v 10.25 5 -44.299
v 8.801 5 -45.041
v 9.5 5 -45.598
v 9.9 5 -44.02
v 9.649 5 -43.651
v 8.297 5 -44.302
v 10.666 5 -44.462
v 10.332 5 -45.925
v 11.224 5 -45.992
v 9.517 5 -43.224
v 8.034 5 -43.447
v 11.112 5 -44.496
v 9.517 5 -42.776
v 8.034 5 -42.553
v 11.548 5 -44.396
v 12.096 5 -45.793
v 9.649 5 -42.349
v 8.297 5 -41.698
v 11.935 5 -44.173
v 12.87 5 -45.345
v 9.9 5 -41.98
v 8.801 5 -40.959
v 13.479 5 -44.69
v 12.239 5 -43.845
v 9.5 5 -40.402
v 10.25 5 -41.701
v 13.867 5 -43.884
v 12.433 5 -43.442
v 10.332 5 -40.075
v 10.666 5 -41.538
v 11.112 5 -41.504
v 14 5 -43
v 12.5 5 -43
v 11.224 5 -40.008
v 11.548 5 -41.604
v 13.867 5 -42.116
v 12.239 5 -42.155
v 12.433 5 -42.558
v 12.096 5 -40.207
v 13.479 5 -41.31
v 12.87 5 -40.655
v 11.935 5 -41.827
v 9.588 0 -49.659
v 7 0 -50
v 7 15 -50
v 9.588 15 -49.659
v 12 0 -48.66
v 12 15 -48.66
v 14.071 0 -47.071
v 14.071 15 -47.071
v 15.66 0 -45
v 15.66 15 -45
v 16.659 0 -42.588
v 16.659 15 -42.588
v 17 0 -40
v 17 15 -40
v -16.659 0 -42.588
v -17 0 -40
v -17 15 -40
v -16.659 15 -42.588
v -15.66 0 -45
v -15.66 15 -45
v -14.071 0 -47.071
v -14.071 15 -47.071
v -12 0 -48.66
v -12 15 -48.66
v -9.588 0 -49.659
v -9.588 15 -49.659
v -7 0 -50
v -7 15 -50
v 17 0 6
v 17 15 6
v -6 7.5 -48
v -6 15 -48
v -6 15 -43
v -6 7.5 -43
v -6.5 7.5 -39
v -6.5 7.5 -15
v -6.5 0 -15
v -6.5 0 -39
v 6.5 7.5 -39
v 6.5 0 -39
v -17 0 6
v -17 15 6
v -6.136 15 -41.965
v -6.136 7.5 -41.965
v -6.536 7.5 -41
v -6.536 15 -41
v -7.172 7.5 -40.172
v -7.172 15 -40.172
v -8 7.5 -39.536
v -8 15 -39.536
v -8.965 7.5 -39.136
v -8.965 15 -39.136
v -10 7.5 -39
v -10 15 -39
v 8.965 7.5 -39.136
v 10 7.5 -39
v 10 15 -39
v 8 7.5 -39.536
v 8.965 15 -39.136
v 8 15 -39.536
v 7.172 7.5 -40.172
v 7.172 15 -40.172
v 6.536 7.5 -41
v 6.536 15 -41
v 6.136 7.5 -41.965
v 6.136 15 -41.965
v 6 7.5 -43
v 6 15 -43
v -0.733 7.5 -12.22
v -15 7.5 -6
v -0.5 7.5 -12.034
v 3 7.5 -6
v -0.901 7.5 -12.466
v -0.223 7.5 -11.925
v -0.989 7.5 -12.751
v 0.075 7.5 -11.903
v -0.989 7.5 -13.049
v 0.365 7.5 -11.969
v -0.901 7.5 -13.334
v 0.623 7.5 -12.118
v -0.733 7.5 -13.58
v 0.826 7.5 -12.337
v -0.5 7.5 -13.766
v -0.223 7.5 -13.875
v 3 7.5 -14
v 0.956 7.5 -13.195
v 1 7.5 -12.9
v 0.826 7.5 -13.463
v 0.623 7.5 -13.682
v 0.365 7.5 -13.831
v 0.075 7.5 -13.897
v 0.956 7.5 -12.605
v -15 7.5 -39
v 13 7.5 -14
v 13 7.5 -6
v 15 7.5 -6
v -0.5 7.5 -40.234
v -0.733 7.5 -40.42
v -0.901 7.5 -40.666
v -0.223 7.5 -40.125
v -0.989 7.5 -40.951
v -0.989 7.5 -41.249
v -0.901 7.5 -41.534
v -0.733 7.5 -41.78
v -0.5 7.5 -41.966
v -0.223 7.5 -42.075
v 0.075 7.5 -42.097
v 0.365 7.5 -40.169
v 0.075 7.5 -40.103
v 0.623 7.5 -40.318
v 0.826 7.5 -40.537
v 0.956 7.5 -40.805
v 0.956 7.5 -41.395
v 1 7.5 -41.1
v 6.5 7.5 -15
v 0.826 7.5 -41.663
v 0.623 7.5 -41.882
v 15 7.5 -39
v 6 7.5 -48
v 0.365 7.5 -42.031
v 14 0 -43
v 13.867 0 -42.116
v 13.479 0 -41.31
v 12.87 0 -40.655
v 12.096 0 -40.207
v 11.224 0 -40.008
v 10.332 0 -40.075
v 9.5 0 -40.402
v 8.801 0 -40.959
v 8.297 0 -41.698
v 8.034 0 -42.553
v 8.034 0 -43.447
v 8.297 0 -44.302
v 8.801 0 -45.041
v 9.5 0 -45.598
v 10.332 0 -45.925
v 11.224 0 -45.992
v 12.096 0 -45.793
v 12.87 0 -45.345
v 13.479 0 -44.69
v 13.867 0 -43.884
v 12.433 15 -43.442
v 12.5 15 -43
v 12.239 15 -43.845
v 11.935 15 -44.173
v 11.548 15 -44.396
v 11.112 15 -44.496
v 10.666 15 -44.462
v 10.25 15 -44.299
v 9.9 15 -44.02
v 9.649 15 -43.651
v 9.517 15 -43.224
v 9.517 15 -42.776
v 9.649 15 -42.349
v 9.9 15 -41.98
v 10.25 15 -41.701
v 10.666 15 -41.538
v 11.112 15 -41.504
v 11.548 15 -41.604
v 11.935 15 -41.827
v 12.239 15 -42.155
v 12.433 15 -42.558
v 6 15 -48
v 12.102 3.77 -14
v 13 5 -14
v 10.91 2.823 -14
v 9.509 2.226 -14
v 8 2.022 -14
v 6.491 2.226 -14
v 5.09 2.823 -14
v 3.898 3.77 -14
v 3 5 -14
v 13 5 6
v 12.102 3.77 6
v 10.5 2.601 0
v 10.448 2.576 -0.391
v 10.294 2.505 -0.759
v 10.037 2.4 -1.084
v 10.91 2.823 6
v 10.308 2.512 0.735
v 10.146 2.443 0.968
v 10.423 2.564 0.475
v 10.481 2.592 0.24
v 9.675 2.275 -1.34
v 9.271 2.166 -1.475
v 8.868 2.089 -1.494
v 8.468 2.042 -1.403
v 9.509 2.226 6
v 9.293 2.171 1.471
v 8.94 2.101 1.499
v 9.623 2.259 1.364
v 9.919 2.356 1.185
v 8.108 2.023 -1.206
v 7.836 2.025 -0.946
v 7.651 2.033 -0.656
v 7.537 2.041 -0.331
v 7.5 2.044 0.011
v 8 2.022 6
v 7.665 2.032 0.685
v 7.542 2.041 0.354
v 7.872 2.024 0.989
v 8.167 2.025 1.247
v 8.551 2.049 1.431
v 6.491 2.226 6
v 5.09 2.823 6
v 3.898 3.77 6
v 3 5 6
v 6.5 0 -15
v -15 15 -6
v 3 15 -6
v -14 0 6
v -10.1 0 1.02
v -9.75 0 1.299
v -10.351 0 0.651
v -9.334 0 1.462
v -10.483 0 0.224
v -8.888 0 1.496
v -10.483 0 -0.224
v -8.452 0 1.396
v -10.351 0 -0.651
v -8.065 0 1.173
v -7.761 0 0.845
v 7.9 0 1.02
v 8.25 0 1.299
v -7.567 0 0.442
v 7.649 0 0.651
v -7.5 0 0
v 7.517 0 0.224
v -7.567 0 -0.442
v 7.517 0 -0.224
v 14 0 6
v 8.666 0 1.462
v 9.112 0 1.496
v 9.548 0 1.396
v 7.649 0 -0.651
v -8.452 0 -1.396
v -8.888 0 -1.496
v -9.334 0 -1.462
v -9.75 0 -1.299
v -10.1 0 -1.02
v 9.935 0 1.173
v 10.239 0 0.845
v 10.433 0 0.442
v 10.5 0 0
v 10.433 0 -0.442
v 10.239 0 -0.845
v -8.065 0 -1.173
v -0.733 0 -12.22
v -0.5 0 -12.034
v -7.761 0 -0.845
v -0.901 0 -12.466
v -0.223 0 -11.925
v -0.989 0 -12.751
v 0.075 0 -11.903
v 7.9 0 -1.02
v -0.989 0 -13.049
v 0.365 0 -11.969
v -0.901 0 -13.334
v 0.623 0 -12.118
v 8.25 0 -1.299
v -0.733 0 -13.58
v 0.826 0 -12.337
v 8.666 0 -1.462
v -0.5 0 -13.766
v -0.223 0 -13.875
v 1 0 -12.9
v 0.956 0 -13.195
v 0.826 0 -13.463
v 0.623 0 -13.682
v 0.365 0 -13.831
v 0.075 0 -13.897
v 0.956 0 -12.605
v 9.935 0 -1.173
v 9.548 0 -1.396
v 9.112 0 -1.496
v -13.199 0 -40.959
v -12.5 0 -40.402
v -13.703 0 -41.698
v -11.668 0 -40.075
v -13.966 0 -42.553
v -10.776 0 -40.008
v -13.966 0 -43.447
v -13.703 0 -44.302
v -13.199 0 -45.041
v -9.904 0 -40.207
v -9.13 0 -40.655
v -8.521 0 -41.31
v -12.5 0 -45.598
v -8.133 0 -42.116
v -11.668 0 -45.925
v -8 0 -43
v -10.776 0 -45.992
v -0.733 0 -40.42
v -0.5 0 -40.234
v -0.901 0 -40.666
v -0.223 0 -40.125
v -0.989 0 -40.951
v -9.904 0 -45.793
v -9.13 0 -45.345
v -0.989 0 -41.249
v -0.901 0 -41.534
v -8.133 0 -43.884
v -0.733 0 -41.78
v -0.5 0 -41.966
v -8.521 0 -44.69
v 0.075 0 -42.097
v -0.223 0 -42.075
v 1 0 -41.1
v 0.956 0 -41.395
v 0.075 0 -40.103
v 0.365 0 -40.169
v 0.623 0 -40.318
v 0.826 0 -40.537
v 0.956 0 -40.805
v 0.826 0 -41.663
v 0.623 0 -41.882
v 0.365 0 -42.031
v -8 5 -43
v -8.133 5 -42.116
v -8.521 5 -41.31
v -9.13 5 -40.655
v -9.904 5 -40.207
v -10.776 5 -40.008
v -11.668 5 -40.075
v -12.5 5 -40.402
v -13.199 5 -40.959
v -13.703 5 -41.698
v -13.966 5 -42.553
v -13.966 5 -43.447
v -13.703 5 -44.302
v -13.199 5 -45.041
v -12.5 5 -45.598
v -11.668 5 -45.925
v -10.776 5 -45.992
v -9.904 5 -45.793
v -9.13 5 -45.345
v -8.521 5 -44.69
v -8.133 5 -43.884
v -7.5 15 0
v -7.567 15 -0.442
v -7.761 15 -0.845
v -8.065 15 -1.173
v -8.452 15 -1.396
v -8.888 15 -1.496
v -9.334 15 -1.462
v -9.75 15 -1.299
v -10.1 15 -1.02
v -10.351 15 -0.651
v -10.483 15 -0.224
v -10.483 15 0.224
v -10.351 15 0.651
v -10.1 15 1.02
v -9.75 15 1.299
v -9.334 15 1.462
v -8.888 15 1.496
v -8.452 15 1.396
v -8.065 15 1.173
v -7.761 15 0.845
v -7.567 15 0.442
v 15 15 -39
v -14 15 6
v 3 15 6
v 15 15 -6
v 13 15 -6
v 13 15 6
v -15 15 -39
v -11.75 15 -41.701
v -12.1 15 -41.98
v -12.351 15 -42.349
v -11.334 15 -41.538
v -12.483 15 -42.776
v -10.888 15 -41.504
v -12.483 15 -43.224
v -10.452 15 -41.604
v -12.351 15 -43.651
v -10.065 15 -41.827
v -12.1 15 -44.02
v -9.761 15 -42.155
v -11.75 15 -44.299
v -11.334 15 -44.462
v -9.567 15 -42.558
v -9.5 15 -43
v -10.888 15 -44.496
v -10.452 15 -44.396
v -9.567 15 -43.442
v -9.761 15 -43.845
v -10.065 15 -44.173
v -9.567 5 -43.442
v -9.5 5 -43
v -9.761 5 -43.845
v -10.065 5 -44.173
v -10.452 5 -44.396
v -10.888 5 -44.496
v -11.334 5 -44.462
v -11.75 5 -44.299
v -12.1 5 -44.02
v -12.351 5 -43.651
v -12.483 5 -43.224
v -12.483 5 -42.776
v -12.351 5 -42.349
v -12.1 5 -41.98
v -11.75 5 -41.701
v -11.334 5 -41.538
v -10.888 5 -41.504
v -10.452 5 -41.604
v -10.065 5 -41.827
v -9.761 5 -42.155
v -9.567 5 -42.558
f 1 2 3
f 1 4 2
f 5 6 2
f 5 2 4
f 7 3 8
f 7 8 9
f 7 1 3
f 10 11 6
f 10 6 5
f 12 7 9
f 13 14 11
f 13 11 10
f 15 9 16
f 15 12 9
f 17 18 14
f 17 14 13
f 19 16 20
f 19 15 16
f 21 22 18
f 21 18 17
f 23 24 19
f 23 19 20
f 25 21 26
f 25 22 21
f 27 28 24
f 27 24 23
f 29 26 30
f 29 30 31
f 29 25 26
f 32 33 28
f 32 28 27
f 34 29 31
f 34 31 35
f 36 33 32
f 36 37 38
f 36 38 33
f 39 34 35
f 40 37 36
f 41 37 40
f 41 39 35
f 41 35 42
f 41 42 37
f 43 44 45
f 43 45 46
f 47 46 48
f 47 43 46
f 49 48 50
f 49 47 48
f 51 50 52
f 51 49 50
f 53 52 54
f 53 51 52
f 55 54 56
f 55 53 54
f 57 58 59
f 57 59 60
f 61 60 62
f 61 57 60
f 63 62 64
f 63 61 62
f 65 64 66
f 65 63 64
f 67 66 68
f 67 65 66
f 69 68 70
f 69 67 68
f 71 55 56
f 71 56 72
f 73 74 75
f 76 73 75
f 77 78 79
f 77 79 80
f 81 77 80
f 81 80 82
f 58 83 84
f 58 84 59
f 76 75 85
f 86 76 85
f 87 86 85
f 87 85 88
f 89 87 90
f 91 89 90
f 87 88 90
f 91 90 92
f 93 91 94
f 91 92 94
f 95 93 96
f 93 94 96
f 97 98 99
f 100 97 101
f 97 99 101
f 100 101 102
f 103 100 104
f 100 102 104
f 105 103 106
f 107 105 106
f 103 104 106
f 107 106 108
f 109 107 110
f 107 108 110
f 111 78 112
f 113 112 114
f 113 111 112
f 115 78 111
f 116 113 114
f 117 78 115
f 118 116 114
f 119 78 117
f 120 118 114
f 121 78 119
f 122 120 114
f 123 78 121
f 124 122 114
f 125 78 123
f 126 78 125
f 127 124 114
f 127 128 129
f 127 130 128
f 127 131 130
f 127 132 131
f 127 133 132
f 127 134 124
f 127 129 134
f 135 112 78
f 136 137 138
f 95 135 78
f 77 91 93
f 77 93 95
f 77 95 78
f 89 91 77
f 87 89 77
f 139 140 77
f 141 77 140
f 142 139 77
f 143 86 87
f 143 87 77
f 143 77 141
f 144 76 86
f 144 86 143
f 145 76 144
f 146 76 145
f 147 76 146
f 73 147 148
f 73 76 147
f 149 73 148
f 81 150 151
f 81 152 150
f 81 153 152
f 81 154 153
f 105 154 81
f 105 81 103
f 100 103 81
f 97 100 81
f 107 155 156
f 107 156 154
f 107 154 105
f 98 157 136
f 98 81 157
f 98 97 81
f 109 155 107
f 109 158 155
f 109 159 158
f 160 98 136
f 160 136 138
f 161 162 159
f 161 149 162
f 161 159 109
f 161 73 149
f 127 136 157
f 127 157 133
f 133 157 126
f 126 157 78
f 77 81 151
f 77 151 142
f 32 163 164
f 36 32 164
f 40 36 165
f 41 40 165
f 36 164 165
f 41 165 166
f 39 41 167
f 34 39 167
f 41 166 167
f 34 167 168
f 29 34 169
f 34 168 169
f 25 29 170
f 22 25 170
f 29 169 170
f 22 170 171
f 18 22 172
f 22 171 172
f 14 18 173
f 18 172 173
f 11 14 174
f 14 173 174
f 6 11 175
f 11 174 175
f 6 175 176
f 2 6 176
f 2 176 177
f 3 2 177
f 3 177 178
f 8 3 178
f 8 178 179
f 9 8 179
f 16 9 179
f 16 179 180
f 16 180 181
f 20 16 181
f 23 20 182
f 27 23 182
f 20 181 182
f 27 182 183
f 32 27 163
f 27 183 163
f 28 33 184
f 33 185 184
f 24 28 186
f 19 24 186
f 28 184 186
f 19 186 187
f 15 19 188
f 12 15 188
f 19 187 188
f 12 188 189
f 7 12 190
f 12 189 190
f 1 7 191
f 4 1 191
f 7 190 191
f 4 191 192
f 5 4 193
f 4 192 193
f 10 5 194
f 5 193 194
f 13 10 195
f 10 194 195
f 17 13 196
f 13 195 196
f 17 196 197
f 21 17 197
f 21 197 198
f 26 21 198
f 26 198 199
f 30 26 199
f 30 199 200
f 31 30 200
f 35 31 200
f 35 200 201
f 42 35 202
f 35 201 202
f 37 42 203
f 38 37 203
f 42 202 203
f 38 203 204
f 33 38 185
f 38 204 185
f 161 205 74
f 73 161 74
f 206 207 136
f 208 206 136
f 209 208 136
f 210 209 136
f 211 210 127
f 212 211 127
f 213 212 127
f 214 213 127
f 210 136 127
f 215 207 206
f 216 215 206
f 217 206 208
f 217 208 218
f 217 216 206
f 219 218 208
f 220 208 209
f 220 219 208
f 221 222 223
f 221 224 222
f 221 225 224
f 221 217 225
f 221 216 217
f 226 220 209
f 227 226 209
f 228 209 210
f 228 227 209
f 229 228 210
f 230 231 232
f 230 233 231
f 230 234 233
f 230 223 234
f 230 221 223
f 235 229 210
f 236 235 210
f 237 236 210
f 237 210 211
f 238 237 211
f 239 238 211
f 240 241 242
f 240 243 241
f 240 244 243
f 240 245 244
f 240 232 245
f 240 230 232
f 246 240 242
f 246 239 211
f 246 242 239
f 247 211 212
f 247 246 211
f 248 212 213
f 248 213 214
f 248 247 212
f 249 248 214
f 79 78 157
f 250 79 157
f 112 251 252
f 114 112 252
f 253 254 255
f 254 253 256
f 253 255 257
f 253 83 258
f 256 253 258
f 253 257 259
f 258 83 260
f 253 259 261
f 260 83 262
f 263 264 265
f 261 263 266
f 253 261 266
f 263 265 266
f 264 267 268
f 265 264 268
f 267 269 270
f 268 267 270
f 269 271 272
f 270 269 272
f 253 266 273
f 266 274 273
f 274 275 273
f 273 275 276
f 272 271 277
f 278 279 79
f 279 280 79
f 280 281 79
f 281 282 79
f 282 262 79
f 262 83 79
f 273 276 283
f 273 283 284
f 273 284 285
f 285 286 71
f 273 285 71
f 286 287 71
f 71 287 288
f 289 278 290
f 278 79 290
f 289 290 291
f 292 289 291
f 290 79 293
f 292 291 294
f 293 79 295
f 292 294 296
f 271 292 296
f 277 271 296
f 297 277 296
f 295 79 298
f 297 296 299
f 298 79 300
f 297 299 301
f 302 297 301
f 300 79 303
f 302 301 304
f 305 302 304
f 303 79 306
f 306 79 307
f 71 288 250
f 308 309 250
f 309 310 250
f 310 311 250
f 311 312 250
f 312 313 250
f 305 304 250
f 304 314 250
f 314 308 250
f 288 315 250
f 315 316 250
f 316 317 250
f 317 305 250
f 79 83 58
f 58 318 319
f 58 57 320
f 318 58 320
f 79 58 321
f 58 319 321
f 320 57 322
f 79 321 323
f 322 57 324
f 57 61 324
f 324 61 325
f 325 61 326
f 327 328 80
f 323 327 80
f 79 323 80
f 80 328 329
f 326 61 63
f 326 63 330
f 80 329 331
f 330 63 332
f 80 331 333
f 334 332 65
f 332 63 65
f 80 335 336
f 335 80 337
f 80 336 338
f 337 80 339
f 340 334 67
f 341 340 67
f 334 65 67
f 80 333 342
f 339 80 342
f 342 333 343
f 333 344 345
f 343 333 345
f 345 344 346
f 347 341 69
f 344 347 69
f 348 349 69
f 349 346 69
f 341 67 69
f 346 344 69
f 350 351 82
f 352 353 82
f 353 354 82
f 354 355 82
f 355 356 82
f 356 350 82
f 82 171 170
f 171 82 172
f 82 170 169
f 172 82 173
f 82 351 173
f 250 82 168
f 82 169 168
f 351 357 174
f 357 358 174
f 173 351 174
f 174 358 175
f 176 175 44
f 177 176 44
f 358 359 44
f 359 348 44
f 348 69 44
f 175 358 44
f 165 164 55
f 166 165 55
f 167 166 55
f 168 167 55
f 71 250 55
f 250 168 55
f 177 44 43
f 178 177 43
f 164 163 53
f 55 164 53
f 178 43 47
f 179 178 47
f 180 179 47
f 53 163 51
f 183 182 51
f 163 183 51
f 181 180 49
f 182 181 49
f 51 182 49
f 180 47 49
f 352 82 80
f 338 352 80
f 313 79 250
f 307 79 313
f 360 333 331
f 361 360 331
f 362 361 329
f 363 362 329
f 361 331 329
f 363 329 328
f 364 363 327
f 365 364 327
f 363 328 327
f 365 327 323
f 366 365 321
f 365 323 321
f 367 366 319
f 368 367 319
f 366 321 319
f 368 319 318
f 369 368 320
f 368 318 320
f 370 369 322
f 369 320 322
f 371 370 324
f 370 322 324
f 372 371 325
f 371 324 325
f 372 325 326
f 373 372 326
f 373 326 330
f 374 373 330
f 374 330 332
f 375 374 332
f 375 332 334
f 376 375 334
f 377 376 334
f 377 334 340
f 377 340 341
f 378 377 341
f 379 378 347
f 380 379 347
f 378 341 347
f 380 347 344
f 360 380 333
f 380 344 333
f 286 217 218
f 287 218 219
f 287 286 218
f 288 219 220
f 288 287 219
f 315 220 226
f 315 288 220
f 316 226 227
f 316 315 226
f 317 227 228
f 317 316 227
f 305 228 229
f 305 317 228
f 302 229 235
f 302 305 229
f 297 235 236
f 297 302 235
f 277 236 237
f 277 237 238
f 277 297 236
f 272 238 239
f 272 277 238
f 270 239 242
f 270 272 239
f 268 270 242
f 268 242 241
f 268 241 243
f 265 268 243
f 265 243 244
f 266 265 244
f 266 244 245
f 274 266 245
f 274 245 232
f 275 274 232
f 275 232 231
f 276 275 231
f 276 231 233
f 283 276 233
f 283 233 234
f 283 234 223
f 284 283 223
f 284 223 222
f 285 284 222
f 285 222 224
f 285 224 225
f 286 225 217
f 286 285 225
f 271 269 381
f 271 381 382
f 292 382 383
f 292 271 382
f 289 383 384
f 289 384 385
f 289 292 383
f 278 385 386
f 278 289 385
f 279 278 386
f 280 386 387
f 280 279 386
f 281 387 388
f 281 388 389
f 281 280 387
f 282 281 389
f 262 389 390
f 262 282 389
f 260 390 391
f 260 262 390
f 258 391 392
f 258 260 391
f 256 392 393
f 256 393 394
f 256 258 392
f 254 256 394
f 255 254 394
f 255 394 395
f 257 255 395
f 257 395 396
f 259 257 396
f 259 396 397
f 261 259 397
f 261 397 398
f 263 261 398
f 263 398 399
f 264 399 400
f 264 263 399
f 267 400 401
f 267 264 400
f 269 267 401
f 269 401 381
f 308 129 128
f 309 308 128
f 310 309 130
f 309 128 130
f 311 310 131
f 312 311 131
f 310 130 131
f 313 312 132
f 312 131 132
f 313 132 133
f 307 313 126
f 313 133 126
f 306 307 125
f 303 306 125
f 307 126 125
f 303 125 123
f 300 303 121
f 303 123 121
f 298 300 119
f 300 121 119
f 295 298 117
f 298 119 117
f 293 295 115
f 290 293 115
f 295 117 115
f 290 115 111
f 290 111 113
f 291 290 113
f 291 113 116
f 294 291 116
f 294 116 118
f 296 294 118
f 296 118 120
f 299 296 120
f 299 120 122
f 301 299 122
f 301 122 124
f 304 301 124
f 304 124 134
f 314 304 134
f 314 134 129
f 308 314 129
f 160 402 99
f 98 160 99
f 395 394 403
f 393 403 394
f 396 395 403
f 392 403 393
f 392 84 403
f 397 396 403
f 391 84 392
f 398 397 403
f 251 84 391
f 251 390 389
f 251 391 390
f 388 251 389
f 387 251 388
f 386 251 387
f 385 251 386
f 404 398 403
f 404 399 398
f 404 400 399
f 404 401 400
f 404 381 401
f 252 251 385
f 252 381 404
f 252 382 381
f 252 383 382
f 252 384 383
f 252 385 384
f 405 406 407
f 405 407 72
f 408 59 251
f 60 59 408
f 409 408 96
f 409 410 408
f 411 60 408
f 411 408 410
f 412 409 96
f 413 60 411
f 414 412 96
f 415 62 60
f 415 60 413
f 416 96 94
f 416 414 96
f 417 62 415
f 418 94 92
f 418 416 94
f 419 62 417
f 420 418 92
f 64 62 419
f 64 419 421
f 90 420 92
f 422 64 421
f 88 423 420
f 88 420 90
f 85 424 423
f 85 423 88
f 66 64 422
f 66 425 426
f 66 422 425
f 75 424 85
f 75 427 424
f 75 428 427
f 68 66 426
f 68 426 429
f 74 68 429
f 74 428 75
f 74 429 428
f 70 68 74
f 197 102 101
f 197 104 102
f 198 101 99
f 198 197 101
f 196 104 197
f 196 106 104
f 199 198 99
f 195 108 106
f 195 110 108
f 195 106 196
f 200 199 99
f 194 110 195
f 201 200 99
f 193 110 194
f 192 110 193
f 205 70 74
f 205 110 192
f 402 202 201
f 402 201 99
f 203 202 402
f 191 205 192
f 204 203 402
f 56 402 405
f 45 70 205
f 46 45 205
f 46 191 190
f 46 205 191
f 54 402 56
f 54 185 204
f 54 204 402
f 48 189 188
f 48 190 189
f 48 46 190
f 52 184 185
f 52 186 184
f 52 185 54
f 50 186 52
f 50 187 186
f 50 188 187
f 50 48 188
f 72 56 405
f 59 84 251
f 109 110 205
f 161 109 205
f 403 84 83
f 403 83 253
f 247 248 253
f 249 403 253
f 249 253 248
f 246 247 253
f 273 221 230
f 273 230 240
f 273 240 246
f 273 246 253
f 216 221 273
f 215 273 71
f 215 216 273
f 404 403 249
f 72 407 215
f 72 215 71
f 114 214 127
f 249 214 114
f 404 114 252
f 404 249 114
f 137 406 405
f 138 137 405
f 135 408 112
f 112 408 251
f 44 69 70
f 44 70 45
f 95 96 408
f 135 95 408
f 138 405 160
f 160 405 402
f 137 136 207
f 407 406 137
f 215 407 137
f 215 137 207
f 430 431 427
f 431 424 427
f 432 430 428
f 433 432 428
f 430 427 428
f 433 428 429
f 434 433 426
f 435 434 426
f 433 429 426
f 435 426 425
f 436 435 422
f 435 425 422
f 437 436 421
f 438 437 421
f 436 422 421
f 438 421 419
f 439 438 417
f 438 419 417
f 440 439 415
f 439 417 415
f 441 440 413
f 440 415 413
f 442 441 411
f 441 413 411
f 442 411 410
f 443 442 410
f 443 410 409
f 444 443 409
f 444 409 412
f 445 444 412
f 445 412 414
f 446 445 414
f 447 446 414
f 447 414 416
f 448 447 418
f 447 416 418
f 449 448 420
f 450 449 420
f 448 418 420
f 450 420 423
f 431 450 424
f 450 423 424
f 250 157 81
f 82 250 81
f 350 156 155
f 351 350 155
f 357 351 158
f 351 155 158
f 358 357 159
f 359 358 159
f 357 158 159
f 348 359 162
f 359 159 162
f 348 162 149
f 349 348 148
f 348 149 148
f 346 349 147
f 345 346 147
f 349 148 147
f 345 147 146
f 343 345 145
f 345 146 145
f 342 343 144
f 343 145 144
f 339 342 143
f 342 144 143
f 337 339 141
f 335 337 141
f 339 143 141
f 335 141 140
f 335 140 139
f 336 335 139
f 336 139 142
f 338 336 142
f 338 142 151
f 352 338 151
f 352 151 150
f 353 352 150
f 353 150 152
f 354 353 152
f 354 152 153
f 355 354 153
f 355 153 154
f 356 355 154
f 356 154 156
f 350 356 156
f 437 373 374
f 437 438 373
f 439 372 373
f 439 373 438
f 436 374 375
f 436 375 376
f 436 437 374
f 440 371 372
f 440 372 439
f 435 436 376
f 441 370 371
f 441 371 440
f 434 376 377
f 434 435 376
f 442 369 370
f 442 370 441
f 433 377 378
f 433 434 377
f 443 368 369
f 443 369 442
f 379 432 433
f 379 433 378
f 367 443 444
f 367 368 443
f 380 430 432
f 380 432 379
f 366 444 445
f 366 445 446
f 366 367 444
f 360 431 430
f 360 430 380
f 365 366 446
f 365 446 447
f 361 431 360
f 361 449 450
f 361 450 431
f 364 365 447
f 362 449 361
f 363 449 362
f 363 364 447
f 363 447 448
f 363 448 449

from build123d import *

# Parameters (mm, degrees)
SKETCH1_R           = 1.5
BOSS_EXTRUDE3_DEPTH = 15
SKETCH3_R           = 1.5
CUT_EXTRUDE1_DEPTH  = 7.5
SKETCH5_W           = 13
SKETCH5_H           = 24
CUT_EXTRUDE2_DEPTH  = 10
SKETCH6_R           = 1
CUT_EXTRUDE3_DEPTH  = 10
SKETCH8_R           = 5.15
CUT_EXTRUDE4_DEPTH  = 15
SKETCH9_W           = 3
SKETCH9_H           = 13
CUT_EXTRUDE5_DEPTH  = 16
FILLET2_R           = 2
SKETCH10_W          = 6
SKETCH10_H          = 1.8
CUT_EXTRUDE6_DEPTH  = 16
SKETCH11_R          = 0.75
CUT_EXTRUDE7_DEPTH  = 10
SKETCH13_R          = 1.5
CUT_EXTRUDE8_DEPTH  = 16
SKETCH14_R          = 3
CUT_EXTRUDE9_DEPTH  = 5
SKETCH15_W          = 9
SKETCH15_H          = 15
SKETCH15_R          = 1.15
BOSS_EXTRUDE4_DEPTH = 2
SKETCH16_W          = 31.135337716
SKETCH16_H          = 16.721473769
CUT_EXTRUDE10_DEPTH = 16
CUT_EXTRUDE11_DEPTH = 20


with BuildPart() as part:
    # Sketch1 → Boss-Extrude3 (new body)
    with BuildSketch(Plane(origin=(0, 0, 0), x_dir=(1, 0, 0), z_dir=(0, 1, 0))):
        with BuildLine():
            Line((17, 40), (17, -19))
            Line((17, -19), (-17, -19))
            Line((-17, -19), (-17, 40))
            ThreePointArc((-17, 40), (-14.071067812, 47.071067812), (-7, 50))
            Line((-7, 50), (7, 50))
            ThreePointArc((7, 50), (14.071067812, 47.071067812), (17, 40))
        make_face()
        with Locations((-9, 0)):
            Circle(SKETCH1_R, mode=Mode.SUBTRACT)
        with Locations((9, 0)):
            Circle(SKETCH1_R, mode=Mode.SUBTRACT)
    extrude(amount=BOSS_EXTRUDE3_DEPTH)

    # Sketch3 → Cut-Extrude1 (cut)
    with BuildSketch(Plane(origin=(0, 15, 0), x_dir=(1, 0, 0), z_dir=(0, 1, 0))):
        with Locations((-11, 43)):
            Circle(SKETCH3_R)
        with Locations((11, 43)):
            Circle(SKETCH3_R)
        with BuildLine():
            Line((6, 48), (-6, 48))
            Line((-6, 48), (-6, 43))
            ThreePointArc((-6, 43), (-7.171572875, 40.171572875), (-10, 39))
            Line((-10, 39), (-15, 39))
            Line((-15, 39), (-15, 6))
            Line((-15, 6), (15, 6))
            Line((15, 6), (15, 39))
            Line((15, 39), (10, 39))
            ThreePointArc((10, 39), (7.171572875, 40.171572875), (6, 43))
            Line((6, 43), (6, 48))
        make_face()
    extrude(amount=-CUT_EXTRUDE1_DEPTH, mode=Mode.SUBTRACT)

    # Sketch5 → Cut-Extrude2 (cut)
    with BuildSketch(Plane(origin=(0, 7.5, 0), x_dir=(1, 0, 0), z_dir=(0, 1, 0))):
        with Locations((0, 27)):
            Rectangle(SKETCH5_W, SKETCH5_H)
    extrude(amount=-CUT_EXTRUDE2_DEPTH, mode=Mode.SUBTRACT)

    # Sketch6 → Cut-Extrude3 (cut)
    with BuildSketch(Plane(origin=(0, 7.5, 0), x_dir=(1, 0, 0), z_dir=(0, 1, 0))):
        with Locations((0, 41.1)):
            Circle(SKETCH6_R)
        with Locations((0, 12.9)):
            Circle(SKETCH6_R)
    extrude(amount=-CUT_EXTRUDE3_DEPTH, mode=Mode.SUBTRACT)

    # Sketch8 → Cut-Extrude4 (cut)
    with BuildSketch(Plane(origin=(0, 15, 0), x_dir=(1, 0, 0), z_dir=(0, 1, 0))):
        with Locations((-6, -12)):
            Circle(SKETCH8_R)
        with Locations((6, -12)):
            Circle(SKETCH8_R)
    extrude(amount=-CUT_EXTRUDE4_DEPTH, mode=Mode.SUBTRACT)

    # Sketch9 → Cut-Extrude5 (cut, through all)
    with BuildSketch(Plane(origin=(0, 15, 0), x_dir=(1, 0, 0), z_dir=(0, 1, 0))):
        with Locations((15.5, -12.5)):
            Rectangle(SKETCH9_W, SKETCH9_H)
        with Locations((-15.5, -12.5)):
            Rectangle(SKETCH9_W, SKETCH9_H)
    extrude(amount=-CUT_EXTRUDE5_DEPTH, mode=Mode.SUBTRACT)

    # Fillet2
    fillet2_edges = [part.edges().sort_by_distance(p)[0] for p in [
        (14, 7.5, 19),
        (-14, 7.5, 19),
    ]]
    fillet(fillet2_edges, radius=FILLET2_R)

    # Sketch10 → Cut-Extrude6 (cut, through all)
    with BuildSketch(Plane(origin=(0, 15, 0), x_dir=(1, 0, 0), z_dir=(0, 1, 0))):
        with Locations((0, -18.1)):
            Rectangle(SKETCH10_W, SKETCH10_H)
    extrude(amount=-CUT_EXTRUDE6_DEPTH, mode=Mode.SUBTRACT)

    # Sketch11 → Cut-Extrude7 (cut)
    with BuildSketch(Plane.XY.offset(17.2)):
        with Locations((0, 7.5)):
            Circle(SKETCH11_R)
    extrude(amount=-CUT_EXTRUDE7_DEPTH, mode=Mode.SUBTRACT)

    # Sketch13 → Cut-Extrude8 (cut, through all)
    with BuildSketch(Plane(origin=(0, 15, 0), x_dir=(1, 0, 0), z_dir=(0, 1, 0))):
        with Locations((11, 43)):
            Circle(SKETCH13_R)
        with Locations((-11, 43)):
            Circle(SKETCH13_R)
    extrude(amount=-CUT_EXTRUDE8_DEPTH, mode=Mode.SUBTRACT)

    # Sketch14 → Cut-Extrude9 (cut)
    with BuildSketch(Plane.XZ):
        with Locations((11, -43)):
            Circle(SKETCH14_R)
        with Locations((-11, -43)):
            Circle(SKETCH14_R)
    extrude(amount=-CUT_EXTRUDE9_DEPTH, mode=Mode.SUBTRACT)

    # Sketch15 → Boss-Extrude4 (add)
    with BuildSketch(Plane.XY.offset(19)):
        with Locations((7.5, 7.5)):
            Rectangle(SKETCH15_W, SKETCH15_H)
        with Locations((8, 12)):
            Circle(SKETCH15_R, mode=Mode.SUBTRACT)
    extrude(amount=BOSS_EXTRUDE4_DEPTH)

    # Sketch16 → Cut-Extrude10 (cut, through all)
    with BuildSketch(Plane(origin=(0, 15, 0), x_dir=(1, 0, 0), z_dir=(0, 1, 0))):
        with Locations((1.567668858, -14.360736885)):
            Rectangle(SKETCH16_W, SKETCH16_H)
    extrude(amount=-CUT_EXTRUDE10_DEPTH, mode=Mode.SUBTRACT)

    # Sketch19 → Cut-Extrude11 (cut)
    with BuildSketch(Plane.XY.offset(6)):
        with BuildLine():
            Line((3, 15), (13, 15))
            Line((13, 15), (13, 5))
            ThreePointArc((13, 5), (8, 2.022346613), (3, 5))
            Line((3, 5), (3, 15))
        make_face()
    extrude(amount=-CUT_EXTRUDE11_DEPTH, mode=Mode.SUBTRACT)


solid = part.part
